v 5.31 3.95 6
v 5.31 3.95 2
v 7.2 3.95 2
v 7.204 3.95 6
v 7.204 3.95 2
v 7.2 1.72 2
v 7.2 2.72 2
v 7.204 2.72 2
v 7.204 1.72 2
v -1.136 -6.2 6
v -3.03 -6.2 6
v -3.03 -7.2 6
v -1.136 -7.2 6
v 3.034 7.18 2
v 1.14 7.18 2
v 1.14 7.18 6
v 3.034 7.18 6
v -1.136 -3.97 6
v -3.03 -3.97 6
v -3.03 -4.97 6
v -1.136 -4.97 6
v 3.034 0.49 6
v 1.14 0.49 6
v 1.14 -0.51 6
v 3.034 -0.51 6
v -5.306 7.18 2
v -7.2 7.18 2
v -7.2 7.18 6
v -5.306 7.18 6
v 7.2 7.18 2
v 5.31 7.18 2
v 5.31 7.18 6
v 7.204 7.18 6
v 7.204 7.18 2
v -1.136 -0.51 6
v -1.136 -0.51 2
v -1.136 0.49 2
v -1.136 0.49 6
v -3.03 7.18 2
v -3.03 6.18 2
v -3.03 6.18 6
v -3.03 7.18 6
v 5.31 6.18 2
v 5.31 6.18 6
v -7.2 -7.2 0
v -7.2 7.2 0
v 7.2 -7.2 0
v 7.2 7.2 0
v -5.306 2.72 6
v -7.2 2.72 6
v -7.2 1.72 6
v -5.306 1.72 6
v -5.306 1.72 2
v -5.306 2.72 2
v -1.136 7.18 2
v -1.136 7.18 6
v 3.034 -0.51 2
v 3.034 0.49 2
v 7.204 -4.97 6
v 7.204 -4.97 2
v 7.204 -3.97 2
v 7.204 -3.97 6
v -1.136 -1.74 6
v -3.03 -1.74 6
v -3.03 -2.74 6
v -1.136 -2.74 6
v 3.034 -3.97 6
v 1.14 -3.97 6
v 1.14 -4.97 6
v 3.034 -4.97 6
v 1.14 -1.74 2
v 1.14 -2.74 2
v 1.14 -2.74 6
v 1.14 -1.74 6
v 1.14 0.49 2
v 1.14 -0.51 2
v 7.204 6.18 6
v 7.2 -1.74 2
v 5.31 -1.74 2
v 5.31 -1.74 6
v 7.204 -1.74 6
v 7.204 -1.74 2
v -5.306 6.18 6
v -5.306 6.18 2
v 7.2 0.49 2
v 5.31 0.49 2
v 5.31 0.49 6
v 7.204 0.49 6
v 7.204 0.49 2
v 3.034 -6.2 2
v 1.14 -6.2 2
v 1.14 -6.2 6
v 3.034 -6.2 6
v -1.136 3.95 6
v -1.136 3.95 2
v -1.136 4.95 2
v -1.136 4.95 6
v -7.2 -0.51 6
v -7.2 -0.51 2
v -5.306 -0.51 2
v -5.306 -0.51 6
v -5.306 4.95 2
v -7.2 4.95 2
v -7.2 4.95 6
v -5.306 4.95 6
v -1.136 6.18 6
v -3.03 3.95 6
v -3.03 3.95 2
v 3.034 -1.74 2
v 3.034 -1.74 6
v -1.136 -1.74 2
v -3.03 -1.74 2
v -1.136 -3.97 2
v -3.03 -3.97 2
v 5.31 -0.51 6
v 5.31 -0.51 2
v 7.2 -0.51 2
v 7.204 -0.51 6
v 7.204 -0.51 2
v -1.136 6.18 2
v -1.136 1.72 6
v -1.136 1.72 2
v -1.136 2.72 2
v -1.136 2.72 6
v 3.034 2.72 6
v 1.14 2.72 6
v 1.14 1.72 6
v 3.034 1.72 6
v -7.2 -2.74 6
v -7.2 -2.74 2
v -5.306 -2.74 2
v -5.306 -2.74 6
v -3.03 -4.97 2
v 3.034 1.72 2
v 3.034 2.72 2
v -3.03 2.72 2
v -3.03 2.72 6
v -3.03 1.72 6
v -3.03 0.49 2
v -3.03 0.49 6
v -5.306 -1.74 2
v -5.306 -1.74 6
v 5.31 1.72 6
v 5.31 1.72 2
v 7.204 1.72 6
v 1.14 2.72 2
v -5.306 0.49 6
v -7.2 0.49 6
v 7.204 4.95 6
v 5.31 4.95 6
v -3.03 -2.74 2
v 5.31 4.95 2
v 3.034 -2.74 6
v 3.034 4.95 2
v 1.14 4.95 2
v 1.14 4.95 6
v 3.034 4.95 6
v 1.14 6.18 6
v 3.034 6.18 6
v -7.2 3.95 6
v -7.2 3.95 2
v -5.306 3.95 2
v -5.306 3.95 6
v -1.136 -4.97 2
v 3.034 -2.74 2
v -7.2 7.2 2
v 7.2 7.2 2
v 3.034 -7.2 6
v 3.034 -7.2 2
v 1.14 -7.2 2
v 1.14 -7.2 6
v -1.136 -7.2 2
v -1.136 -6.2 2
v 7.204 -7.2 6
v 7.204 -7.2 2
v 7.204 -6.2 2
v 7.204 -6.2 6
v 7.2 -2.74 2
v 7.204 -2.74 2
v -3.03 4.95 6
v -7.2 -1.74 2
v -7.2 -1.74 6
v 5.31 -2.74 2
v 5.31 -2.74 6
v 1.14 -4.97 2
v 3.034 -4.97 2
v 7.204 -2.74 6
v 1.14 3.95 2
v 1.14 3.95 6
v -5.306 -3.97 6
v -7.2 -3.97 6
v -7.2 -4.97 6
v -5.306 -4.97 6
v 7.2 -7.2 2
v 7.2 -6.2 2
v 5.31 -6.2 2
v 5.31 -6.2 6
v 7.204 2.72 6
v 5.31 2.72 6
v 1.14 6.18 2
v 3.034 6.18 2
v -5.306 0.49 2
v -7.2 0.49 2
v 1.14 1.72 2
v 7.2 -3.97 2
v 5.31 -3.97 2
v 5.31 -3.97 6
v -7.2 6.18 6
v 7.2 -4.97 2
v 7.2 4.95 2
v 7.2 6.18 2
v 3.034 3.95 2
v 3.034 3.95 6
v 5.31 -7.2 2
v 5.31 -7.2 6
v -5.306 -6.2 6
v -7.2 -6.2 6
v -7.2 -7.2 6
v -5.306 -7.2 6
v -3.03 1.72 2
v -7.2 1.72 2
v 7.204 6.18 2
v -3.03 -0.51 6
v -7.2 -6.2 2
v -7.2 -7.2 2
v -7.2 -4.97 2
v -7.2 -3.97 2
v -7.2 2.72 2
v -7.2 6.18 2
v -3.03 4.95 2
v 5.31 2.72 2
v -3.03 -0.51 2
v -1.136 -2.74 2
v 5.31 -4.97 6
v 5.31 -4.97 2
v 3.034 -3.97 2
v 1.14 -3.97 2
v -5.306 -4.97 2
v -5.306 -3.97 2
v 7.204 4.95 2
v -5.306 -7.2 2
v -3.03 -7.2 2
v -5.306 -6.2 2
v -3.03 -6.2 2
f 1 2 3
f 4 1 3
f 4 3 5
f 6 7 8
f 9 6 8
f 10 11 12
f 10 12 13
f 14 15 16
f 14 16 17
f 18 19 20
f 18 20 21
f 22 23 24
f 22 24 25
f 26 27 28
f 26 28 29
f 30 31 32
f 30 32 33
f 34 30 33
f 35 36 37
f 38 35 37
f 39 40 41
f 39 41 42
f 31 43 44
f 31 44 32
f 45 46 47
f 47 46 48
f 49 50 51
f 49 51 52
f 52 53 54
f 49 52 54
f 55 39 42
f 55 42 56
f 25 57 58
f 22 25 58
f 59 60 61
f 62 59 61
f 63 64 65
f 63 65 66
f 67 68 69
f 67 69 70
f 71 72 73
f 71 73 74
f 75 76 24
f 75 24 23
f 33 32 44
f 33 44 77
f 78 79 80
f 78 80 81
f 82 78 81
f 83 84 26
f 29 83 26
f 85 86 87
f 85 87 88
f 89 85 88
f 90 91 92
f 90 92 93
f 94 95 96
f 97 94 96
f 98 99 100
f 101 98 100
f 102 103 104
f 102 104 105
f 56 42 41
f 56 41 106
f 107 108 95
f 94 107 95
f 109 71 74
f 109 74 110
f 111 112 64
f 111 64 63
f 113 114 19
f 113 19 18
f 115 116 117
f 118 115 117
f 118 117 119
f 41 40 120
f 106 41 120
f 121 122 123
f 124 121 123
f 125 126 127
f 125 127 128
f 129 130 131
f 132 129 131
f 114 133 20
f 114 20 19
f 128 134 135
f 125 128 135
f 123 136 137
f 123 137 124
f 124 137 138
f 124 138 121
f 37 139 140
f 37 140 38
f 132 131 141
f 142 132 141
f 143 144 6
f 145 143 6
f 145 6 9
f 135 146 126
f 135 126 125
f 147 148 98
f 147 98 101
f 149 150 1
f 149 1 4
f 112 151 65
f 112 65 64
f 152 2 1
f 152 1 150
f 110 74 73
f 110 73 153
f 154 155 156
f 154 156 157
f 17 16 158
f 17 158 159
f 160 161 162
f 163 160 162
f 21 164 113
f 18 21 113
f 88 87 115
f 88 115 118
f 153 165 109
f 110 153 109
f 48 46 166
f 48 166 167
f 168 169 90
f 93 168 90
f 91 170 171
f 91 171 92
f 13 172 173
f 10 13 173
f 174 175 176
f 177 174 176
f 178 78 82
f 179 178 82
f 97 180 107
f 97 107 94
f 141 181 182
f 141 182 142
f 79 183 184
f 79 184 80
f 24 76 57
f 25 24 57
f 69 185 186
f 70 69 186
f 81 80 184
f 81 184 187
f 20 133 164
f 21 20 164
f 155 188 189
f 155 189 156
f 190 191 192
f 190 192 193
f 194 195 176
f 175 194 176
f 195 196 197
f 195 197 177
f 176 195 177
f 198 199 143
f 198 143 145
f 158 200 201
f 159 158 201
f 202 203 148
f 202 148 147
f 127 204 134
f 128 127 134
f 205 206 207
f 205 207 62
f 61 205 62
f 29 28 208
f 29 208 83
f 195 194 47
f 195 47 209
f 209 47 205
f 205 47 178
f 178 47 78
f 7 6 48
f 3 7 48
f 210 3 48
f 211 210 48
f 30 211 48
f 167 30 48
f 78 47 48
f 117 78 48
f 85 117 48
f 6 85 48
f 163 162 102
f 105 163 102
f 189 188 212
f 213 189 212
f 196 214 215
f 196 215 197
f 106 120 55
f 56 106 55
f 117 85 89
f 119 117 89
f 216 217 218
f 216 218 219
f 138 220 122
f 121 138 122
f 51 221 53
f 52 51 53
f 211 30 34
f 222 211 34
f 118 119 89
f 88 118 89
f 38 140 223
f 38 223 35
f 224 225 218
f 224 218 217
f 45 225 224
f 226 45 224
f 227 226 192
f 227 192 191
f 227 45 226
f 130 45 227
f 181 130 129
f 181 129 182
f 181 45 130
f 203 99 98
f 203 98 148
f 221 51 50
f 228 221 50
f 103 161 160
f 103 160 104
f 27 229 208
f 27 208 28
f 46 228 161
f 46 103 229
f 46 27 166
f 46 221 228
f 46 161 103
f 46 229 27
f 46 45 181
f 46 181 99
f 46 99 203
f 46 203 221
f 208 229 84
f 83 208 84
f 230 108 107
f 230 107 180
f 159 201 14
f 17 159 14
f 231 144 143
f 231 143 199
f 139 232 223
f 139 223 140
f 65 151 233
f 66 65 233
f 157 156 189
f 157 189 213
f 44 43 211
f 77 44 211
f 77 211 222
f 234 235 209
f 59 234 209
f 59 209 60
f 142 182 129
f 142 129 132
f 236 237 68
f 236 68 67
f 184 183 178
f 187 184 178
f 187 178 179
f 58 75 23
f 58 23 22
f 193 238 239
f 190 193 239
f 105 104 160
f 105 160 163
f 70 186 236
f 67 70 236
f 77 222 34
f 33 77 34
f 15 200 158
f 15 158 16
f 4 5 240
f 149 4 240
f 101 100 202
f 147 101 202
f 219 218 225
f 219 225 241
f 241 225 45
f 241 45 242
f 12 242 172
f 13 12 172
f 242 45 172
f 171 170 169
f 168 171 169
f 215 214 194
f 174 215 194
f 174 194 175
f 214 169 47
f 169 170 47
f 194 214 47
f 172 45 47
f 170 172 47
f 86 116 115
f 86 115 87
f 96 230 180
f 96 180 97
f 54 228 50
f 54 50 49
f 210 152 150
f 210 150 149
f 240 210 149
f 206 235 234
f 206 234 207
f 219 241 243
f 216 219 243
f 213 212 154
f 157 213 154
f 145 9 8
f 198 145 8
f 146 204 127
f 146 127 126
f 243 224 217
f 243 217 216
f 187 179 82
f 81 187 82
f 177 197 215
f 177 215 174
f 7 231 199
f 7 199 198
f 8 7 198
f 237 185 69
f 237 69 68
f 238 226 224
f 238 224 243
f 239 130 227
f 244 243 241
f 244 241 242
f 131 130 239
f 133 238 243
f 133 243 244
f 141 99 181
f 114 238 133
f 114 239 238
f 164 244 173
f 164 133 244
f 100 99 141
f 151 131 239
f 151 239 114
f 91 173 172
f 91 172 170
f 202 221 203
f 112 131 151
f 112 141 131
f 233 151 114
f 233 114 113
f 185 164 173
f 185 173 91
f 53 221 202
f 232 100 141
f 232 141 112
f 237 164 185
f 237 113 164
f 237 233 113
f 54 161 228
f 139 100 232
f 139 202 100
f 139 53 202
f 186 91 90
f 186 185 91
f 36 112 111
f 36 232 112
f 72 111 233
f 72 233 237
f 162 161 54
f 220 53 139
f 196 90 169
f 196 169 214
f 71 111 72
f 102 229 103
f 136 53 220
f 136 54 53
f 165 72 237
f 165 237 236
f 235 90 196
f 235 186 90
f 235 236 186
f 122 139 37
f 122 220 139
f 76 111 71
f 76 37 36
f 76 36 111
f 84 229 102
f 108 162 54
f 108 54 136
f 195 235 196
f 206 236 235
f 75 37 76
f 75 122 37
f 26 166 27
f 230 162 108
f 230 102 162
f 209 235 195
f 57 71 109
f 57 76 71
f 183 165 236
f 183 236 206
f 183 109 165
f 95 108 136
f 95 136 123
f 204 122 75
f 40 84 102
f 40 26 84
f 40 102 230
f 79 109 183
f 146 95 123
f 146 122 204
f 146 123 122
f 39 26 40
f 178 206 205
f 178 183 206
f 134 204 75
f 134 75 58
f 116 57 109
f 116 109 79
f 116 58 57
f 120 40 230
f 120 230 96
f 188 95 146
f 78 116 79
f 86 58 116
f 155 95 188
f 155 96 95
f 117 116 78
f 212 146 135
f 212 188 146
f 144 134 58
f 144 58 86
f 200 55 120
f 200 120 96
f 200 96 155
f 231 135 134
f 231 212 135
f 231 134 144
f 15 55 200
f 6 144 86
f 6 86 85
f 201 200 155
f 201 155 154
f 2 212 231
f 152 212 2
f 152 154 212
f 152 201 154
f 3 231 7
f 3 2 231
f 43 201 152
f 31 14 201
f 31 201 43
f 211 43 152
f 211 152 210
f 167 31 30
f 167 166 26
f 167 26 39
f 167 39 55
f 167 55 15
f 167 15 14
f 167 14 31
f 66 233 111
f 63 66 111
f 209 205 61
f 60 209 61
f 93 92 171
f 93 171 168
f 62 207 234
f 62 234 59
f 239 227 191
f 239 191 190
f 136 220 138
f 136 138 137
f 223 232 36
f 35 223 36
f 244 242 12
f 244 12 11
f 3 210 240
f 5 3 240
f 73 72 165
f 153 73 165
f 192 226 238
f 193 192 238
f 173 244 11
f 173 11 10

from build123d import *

# Parameters (mm, degrees)
CROQUIS1_W              = 14.4
CROQUIS1_H              = 14.4
SALIENTE_EXTRUIR1_DEPTH = 2
CROQUIS2_W              = 1.894290675
CROQUIS2_H              = 1
SALIENTE_EXTRUIR2_DEPTH = 4


with BuildPart() as part:
    # Croquis1 → Saliente-Extruir1 (new body)
    with BuildSketch(Plane.XY):
        Rectangle(CROQUIS1_W, CROQUIS1_H)
    extrude(amount=SALIENTE_EXTRUIR1_DEPTH)

    # Croquis2 → Saliente-Extruir2 (add)
    with BuildSketch(Plane.XY.offset(2)):
        with Locations((-2.082854662, -6.7)):
            Rectangle(CROQUIS2_W, CROQUIS2_H)
        with Locations((-6.252854663, -6.7)):
            Rectangle(CROQUIS2_W, CROQUIS2_H)
        with Locations((2.087145337, -6.7)):
            Rectangle(CROQUIS2_W, CROQUIS2_H)
        with Locations((6.257145338, -6.7)):
            Rectangle(CROQUIS2_W, CROQUIS2_H)
        with Locations((-2.082854662, -4.47)):
            Rectangle(CROQUIS2_W, CROQUIS2_H)
        with Locations((2.087145337, -4.47)):
            Rectangle(CROQUIS2_W, CROQUIS2_H)
        with Locations((6.257145338, -4.47)):
            Rectangle(CROQUIS2_W, CROQUIS2_H)
        with Locations((-2.082854662, -2.24)):
            Rectangle(CROQUIS2_W, CROQUIS2_H)
        with Locations((2.087145337, -2.24)):
            Rectangle(CROQUIS2_W, CROQUIS2_H)
        with Locations((6.257145338, -2.24)):
            Rectangle(CROQUIS2_W, CROQUIS2_H)
        with Locations((-2.082854662, -0.01)):
            Rectangle(CROQUIS2_W, CROQUIS2_H)
        with Locations((2.087145337, -0.01)):
            Rectangle(CROQUIS2_W, CROQUIS2_H)
        with Locations((6.257145338, -0.01)):
            Rectangle(CROQUIS2_W, CROQUIS2_H)
        with Locations((-2.082854662, 2.22)):
            Rectangle(CROQUIS2_W, CROQUIS2_H)
        with Locations((2.087145337, 2.22)):
            Rectangle(CROQUIS2_W, CROQUIS2_H)
        with Locations((6.257145338, 2.22)):
            Rectangle(CROQUIS2_W, CROQUIS2_H)
        with Locations((-2.082854662, 4.45)):
            Rectangle(CROQUIS2_W, CROQUIS2_H)
        with Locations((2.087145337, 4.45)):
            Rectangle(CROQUIS2_W, CROQUIS2_H)
        with Locations((6.257145338, 4.45)):
            Rectangle(CROQUIS2_W, CROQUIS2_H)
        with Locations((-2.082854662, 6.68)):
            Rectangle(CROQUIS2_W, CROQUIS2_H)
        with Locations((2.087145337, 6.68)):
            Rectangle(CROQUIS2_W, CROQUIS2_H)
        with Locations((6.257145338, 6.68)):
            Rectangle(CROQUIS2_W, CROQUIS2_H)
        with Locations((-6.252854663, -4.47)):
            Rectangle(CROQUIS2_W, CROQUIS2_H)
        with Locations((-6.252854663, -2.24)):
            Rectangle(CROQUIS2_W, CROQUIS2_H)
        with Locations((-6.252854663, -0.01)):
            Rectangle(CROQUIS2_W, CROQUIS2_H)
        with Locations((-6.252854663, 2.22)):
            Rectangle(CROQUIS2_W, CROQUIS2_H)
        with Locations((-6.252854663, 4.45)):
            Rectangle(CROQUIS2_W, CROQUIS2_H)
        with Locations((-6.252854663, 6.68)):
            Rectangle(CROQUIS2_W, CROQUIS2_H)
    extrude(amount=SALIENTE_EXTRUIR2_DEPTH)


solid = part.part
